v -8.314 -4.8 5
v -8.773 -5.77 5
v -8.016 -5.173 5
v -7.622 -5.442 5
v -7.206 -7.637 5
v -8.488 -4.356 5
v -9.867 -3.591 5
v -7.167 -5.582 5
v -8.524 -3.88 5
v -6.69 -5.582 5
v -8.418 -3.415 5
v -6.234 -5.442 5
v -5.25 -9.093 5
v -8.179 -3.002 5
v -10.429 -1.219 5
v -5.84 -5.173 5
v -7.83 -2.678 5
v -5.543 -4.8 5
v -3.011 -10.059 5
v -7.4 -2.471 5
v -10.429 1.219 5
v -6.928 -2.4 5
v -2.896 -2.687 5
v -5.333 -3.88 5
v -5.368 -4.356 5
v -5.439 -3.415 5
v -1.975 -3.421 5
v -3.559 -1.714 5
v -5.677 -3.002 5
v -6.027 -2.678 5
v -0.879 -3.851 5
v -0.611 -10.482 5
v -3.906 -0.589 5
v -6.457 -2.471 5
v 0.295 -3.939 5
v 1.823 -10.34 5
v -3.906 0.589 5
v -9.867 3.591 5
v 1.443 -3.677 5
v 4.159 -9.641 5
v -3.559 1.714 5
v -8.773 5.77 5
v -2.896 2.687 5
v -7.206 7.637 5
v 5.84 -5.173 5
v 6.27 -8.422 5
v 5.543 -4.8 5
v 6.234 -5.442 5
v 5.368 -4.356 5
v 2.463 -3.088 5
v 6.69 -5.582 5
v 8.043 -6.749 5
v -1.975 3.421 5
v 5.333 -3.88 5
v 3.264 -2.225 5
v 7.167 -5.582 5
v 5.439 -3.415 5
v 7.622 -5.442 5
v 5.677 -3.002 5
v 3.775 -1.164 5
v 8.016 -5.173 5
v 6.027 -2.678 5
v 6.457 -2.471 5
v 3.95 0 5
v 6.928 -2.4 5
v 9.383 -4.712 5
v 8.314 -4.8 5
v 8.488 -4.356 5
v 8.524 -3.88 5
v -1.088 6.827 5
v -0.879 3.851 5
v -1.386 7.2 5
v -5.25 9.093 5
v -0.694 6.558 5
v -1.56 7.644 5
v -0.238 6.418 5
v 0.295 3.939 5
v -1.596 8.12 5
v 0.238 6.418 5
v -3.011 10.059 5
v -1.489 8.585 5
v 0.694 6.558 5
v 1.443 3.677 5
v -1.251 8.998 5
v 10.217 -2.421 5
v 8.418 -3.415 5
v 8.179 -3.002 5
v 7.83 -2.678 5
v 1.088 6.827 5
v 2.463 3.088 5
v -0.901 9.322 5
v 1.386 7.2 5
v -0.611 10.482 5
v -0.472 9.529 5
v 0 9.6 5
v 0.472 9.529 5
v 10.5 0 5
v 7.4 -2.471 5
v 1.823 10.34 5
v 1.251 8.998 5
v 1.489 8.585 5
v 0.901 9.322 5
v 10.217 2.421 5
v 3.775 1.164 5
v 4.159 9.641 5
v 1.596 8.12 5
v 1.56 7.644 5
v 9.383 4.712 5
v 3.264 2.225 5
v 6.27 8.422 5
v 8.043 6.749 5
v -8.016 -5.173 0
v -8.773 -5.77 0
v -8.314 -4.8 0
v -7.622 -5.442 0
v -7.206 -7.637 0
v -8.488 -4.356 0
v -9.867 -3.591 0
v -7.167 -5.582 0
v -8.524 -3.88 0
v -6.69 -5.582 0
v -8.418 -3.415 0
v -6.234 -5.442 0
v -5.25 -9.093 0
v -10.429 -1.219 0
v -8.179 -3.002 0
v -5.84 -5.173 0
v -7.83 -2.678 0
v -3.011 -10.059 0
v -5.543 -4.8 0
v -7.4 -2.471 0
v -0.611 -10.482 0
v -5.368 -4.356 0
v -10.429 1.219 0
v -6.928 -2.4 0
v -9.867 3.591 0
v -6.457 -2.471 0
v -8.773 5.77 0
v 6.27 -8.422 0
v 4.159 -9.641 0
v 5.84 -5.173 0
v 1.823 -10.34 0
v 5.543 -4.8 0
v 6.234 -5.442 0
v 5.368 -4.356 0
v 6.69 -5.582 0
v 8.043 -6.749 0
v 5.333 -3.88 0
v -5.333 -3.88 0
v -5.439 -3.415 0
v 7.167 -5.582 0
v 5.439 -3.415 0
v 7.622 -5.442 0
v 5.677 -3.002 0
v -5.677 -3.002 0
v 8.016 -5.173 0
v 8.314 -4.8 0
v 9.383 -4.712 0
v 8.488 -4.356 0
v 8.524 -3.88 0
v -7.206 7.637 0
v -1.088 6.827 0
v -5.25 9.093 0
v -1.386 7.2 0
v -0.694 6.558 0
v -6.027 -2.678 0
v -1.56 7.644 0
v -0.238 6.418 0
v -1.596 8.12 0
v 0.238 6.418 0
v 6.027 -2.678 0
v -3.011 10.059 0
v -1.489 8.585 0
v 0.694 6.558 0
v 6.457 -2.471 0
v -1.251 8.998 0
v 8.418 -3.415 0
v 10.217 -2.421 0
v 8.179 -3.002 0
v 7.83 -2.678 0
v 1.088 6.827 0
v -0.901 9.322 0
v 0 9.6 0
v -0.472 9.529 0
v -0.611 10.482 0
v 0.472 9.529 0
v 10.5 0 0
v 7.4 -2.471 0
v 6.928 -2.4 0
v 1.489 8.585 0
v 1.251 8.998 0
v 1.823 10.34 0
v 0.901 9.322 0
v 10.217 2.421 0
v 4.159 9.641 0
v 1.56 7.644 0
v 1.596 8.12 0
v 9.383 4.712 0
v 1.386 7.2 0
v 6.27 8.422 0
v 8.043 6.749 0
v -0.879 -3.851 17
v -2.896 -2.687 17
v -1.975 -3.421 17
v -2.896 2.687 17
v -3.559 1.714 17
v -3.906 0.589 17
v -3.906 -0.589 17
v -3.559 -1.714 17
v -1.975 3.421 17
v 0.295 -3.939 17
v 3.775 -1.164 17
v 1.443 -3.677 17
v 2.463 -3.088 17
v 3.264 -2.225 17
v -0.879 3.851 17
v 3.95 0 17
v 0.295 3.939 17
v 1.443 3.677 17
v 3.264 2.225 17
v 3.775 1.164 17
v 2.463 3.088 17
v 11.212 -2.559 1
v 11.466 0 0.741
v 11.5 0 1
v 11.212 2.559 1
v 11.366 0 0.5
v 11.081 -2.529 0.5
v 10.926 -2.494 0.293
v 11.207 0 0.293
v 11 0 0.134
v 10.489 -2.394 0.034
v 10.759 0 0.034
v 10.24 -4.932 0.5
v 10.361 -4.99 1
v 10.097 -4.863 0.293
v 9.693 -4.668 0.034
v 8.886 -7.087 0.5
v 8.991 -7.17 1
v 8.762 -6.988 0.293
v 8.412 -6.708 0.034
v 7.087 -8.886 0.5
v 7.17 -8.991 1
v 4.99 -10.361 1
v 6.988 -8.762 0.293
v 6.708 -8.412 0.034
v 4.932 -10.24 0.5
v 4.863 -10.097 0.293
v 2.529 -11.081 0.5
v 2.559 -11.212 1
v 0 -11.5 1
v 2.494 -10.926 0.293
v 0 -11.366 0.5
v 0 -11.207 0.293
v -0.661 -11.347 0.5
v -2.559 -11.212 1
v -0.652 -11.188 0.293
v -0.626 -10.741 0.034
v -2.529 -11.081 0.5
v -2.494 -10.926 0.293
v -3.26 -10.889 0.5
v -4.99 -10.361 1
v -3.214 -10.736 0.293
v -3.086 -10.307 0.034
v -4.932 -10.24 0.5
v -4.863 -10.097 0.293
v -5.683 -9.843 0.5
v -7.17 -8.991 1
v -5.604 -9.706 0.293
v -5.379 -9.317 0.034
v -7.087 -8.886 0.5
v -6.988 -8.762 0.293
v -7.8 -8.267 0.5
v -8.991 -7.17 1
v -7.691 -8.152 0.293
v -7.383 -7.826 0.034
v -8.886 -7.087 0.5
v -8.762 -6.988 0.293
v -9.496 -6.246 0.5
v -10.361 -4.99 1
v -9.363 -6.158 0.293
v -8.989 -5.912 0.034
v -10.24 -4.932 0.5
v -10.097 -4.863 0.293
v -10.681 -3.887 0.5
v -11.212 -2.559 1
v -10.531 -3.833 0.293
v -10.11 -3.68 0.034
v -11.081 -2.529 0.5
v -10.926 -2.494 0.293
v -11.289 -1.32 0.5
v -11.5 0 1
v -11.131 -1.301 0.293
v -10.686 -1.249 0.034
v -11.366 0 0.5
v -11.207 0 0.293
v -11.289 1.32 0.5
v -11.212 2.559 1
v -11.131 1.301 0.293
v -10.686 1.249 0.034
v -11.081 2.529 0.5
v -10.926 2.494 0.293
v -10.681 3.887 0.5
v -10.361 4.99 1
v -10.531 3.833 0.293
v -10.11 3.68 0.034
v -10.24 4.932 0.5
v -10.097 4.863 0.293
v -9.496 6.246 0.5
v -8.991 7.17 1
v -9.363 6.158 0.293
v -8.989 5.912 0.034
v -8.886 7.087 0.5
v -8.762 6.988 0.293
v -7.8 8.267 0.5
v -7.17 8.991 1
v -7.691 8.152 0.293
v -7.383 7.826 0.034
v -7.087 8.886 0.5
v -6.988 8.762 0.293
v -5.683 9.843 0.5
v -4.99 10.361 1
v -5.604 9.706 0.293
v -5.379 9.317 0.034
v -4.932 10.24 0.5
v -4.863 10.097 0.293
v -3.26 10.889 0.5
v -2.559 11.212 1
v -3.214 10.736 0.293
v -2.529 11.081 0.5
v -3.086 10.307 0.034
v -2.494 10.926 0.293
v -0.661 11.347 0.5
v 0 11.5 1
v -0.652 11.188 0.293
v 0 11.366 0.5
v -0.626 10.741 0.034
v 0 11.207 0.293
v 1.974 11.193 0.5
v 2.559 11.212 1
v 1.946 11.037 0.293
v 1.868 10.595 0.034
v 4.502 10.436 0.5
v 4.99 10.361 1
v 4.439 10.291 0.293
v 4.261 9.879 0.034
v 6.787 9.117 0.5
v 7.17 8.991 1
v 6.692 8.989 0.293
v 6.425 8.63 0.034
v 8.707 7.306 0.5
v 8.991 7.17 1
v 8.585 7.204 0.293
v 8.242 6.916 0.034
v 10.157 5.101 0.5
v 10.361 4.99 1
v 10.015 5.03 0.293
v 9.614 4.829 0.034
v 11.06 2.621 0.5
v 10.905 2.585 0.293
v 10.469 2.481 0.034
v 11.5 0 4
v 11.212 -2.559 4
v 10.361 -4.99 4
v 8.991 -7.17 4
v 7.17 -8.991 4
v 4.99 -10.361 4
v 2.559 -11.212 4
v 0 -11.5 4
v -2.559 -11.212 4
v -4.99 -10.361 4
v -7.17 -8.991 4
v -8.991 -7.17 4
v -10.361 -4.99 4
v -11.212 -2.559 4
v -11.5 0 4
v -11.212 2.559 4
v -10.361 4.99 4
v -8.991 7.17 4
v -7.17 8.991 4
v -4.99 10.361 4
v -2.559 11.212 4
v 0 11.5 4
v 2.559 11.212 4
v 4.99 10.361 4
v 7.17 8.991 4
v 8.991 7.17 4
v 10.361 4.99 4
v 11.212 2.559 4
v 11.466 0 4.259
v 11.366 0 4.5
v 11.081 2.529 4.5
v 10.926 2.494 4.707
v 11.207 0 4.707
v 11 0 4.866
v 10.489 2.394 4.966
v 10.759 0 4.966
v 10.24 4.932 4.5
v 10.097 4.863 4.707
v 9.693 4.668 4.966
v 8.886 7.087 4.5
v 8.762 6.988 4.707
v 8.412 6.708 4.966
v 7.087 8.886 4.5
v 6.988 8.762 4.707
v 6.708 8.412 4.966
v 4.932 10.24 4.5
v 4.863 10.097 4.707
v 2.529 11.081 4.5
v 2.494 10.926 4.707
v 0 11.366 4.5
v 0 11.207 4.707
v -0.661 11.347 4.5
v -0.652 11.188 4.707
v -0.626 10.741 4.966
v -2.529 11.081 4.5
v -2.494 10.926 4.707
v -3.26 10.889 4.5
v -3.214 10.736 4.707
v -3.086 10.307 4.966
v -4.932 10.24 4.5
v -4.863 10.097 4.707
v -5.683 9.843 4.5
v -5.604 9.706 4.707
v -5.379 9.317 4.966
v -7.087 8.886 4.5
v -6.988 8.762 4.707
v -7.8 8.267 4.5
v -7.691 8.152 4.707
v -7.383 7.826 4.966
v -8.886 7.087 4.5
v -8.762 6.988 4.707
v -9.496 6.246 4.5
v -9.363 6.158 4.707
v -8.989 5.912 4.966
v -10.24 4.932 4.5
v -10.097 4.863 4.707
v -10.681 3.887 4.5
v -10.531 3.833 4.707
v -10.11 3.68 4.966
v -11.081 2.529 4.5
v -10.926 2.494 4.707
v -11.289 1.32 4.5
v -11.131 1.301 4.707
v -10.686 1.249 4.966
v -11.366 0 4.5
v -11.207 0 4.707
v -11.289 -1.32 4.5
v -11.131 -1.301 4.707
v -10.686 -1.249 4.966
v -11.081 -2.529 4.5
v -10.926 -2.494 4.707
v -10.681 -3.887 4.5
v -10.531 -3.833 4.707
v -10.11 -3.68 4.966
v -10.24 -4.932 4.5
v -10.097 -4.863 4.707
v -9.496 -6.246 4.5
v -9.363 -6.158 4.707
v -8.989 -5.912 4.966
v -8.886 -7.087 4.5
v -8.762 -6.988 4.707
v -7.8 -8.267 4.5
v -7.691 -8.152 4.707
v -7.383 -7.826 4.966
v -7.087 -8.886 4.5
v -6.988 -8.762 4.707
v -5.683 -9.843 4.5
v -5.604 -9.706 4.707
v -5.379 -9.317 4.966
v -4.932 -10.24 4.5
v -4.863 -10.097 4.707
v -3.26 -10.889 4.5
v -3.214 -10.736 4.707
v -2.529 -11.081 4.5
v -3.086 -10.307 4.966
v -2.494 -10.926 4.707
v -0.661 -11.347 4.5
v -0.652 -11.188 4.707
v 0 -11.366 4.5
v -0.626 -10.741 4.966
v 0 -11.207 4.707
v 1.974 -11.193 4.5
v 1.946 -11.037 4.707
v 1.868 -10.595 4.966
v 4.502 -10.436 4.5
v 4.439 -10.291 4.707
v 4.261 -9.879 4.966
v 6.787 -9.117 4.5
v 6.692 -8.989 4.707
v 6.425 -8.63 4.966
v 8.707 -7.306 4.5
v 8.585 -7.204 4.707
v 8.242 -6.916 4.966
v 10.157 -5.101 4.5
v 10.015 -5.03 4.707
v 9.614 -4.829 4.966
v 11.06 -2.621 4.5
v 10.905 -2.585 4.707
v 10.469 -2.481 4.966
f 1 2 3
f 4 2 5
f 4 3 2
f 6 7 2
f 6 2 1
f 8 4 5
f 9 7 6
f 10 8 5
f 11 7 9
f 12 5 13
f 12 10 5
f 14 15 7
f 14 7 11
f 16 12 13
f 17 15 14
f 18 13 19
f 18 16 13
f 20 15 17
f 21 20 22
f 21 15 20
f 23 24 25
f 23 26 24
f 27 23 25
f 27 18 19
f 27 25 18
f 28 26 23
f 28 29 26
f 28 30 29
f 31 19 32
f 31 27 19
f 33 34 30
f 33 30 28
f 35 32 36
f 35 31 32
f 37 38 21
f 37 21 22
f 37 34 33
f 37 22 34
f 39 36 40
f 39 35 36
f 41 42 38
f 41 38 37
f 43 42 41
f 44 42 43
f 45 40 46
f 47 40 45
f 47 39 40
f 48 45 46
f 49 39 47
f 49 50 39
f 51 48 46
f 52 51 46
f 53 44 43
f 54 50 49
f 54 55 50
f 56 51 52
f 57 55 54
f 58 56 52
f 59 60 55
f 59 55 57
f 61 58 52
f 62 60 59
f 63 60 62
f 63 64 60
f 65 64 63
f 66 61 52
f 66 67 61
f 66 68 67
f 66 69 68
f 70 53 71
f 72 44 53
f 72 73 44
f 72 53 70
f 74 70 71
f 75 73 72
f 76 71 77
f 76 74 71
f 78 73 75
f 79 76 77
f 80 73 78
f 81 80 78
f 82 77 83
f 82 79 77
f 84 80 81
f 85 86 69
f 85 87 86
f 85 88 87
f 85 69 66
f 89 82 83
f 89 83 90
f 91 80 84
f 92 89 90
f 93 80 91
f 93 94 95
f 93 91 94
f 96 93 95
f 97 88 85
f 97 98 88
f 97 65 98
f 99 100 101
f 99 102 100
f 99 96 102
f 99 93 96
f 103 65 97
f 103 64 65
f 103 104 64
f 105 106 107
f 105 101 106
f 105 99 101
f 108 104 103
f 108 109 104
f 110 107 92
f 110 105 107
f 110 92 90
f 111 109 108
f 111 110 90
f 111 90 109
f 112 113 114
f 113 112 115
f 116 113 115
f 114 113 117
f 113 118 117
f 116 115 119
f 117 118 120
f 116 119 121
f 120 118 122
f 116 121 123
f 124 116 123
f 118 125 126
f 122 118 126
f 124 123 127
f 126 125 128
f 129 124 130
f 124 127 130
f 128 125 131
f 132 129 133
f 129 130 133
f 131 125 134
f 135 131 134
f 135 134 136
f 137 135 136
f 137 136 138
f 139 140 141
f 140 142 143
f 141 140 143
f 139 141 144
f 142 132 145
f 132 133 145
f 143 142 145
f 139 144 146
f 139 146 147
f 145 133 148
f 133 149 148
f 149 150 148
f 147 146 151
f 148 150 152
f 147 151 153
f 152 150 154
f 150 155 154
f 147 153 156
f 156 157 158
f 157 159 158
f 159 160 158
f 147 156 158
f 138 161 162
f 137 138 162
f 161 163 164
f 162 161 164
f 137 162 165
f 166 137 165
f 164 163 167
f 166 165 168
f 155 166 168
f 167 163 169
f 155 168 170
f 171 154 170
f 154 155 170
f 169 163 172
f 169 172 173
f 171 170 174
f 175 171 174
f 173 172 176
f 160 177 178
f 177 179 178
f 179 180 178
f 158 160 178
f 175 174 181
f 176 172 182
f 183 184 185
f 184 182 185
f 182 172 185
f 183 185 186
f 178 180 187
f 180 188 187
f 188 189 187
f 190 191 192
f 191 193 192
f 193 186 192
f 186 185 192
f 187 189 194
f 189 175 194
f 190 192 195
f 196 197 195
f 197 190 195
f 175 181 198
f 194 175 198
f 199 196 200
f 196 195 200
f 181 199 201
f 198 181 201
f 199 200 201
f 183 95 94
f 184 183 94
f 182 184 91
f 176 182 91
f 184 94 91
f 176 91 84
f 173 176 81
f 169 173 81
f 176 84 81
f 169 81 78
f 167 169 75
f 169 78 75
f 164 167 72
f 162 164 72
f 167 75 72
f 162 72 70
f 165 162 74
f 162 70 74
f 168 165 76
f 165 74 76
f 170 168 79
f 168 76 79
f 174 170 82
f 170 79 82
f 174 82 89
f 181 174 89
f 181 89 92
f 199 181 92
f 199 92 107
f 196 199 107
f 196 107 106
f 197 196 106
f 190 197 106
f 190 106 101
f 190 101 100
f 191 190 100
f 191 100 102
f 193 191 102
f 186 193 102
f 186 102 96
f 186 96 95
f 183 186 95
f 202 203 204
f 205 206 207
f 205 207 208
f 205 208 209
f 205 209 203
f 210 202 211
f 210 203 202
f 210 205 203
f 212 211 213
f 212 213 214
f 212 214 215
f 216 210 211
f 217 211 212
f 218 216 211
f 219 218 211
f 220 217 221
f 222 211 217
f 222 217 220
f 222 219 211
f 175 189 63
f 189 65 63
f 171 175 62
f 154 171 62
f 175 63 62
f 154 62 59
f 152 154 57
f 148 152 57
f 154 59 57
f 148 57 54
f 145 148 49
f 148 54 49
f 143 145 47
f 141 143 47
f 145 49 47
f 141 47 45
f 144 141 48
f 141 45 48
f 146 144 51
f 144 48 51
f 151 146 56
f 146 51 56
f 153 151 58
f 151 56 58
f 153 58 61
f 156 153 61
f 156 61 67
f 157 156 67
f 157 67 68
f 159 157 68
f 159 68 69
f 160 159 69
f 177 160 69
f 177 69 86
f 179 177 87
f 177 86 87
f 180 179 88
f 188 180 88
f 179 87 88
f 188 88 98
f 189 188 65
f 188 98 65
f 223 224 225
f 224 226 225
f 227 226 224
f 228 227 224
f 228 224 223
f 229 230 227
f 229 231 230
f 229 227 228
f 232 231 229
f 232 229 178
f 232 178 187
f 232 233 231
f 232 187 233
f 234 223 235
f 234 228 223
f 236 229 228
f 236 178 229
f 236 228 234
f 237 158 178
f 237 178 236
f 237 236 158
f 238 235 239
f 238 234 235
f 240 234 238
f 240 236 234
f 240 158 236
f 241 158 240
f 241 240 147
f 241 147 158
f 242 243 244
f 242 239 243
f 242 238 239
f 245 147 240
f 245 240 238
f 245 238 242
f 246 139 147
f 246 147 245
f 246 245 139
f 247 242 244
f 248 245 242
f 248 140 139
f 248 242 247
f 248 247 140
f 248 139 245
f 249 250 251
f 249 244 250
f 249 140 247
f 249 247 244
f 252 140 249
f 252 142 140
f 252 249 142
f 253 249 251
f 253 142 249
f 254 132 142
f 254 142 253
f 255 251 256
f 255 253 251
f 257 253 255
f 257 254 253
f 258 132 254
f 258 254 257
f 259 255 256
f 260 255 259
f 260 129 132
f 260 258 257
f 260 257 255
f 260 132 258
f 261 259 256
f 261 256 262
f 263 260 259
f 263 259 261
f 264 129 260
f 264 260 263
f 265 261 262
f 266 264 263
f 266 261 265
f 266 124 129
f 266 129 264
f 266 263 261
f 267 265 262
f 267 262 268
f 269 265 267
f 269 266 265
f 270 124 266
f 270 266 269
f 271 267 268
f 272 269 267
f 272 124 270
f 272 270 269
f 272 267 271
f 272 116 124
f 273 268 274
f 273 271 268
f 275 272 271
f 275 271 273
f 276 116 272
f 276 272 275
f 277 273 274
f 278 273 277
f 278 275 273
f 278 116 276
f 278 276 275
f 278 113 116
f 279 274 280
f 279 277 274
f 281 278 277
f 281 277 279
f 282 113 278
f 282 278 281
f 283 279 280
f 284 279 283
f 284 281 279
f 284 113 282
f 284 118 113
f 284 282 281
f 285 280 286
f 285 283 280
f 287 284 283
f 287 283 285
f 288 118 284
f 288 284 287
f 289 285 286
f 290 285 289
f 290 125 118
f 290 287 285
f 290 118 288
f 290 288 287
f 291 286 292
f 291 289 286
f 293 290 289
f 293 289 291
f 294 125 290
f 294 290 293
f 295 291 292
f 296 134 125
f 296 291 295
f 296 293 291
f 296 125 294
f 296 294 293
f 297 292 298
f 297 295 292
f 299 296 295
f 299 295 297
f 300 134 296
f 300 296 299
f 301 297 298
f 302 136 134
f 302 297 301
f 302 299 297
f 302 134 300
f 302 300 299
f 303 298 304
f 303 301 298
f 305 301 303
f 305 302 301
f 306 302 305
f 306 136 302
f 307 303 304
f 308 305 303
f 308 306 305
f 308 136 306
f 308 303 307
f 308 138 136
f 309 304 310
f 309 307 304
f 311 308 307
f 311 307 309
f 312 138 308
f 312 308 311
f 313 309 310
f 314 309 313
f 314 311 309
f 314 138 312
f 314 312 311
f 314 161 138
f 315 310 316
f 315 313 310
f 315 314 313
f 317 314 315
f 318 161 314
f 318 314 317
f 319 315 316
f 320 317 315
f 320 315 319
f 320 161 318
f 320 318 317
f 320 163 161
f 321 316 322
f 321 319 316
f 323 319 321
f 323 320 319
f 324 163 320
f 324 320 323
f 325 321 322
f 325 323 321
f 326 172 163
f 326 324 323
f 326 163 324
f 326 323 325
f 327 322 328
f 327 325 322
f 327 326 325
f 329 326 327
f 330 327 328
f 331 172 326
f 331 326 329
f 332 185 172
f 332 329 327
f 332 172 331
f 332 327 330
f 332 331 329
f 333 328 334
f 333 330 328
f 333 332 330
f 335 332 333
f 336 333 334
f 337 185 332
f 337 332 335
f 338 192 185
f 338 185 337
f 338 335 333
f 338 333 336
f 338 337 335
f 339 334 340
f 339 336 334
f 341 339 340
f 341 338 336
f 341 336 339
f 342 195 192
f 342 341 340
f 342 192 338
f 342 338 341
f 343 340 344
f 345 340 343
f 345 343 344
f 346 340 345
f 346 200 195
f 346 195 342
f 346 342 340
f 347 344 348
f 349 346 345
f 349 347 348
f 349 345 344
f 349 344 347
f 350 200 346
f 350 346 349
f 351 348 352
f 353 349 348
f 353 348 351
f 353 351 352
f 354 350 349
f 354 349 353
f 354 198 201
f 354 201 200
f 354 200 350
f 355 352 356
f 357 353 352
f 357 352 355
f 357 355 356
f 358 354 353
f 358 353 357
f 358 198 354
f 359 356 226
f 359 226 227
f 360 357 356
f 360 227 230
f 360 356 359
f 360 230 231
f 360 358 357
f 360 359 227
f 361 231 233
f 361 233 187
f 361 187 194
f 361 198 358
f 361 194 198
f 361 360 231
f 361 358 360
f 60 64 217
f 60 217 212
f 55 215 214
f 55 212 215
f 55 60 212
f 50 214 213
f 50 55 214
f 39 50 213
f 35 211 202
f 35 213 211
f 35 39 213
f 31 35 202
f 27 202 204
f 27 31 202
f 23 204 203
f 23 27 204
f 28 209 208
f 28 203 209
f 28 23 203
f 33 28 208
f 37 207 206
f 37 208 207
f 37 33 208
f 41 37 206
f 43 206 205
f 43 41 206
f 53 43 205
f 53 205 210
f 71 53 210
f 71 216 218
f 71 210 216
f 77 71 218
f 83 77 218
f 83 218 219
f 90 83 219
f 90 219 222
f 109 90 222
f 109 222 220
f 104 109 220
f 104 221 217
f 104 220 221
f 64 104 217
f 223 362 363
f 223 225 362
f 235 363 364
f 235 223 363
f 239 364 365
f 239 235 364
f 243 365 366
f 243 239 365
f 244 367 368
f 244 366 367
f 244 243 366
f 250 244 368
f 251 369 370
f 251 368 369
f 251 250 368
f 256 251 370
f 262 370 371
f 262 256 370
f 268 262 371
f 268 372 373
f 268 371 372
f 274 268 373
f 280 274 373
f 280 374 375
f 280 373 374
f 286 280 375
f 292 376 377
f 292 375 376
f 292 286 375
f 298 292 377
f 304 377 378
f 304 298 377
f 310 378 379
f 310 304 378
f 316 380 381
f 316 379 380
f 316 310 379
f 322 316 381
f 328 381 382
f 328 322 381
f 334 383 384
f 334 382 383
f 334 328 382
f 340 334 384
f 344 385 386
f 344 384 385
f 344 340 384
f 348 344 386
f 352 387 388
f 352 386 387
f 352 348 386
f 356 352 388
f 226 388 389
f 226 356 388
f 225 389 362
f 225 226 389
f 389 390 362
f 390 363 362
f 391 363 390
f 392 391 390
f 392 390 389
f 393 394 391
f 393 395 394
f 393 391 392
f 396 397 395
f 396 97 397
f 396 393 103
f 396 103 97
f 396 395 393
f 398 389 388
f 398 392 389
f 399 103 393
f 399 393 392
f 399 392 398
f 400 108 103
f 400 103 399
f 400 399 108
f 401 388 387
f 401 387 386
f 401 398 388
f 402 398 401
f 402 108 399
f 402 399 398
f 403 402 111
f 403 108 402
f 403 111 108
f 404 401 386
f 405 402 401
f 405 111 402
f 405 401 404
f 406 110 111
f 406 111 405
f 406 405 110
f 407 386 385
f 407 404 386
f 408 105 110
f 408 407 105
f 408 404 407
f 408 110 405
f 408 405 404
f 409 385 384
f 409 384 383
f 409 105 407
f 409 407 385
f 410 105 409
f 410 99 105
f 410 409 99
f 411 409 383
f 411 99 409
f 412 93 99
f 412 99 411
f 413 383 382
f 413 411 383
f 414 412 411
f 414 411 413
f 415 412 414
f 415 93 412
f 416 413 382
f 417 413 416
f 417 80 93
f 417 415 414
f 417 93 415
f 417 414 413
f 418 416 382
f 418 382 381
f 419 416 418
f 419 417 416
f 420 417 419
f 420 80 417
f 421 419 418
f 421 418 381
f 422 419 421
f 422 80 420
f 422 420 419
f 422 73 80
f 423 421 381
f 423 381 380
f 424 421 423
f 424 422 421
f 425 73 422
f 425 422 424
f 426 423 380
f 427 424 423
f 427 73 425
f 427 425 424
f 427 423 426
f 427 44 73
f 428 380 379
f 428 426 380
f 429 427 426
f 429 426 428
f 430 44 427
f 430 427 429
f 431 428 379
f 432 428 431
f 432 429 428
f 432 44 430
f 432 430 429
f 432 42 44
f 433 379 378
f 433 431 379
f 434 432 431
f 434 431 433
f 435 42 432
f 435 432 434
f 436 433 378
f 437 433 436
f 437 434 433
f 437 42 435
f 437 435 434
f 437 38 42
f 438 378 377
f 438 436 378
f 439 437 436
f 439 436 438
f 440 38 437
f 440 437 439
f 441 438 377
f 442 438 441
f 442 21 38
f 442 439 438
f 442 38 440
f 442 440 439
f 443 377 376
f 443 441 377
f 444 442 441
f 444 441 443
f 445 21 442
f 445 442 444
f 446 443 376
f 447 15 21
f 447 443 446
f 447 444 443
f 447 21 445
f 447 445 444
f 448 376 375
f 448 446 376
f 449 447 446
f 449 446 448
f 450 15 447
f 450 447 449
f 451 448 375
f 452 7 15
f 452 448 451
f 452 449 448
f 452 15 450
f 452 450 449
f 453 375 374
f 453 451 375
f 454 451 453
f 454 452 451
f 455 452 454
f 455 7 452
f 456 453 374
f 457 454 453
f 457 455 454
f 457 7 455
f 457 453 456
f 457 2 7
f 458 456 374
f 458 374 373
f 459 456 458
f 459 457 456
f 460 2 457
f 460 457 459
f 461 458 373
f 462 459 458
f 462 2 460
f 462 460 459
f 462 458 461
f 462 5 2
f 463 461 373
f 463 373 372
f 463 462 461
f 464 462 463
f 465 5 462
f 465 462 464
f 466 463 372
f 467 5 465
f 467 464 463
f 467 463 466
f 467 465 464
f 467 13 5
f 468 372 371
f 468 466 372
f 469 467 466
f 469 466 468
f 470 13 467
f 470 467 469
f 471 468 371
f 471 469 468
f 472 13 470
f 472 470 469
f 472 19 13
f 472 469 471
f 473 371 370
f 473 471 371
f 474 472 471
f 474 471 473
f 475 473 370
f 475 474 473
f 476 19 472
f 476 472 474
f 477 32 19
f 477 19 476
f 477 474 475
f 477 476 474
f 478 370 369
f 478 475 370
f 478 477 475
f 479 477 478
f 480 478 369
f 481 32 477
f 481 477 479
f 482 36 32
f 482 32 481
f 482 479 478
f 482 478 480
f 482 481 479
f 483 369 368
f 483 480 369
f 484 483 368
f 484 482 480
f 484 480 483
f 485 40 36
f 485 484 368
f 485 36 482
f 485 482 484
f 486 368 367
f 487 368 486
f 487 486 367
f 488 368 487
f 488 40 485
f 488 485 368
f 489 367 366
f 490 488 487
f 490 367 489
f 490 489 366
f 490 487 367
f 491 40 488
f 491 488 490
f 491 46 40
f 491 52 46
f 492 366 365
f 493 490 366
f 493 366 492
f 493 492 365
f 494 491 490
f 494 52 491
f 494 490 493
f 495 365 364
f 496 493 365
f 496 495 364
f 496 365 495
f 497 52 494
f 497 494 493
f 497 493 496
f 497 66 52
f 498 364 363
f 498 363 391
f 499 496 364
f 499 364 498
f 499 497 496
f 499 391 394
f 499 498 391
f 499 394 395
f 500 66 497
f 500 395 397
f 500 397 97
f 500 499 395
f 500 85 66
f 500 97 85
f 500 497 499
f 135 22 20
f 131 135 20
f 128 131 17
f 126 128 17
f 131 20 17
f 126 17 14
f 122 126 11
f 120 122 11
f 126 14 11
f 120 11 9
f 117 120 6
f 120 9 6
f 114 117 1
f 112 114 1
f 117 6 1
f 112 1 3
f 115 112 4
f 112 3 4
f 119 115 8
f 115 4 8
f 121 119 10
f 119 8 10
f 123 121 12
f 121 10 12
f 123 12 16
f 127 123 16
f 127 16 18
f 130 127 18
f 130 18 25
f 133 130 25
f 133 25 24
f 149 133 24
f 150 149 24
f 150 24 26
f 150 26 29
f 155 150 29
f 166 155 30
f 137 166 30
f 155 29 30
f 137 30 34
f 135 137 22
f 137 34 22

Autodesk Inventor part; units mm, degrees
ref_plane "YZ Plane" through (0, 0, 0) normal (1, 0, 0) x (0, 1, 0)
ref_plane "XZ Plane" through (0, 0, 0) normal (0, 1, 0) x (-1, 0, 0)
ref_plane "XY Plane" through (0, 0, 0) normal (0, 0, 1) x (1, 0, 0)
sketch "Sketch1" plane through (0, 0, 0) normal (0, 0, 1) x (1, 0, 0)
  circle A0 centre (0, 0) radius 11.5
  dimension "d0" = 23
extrude "Extrusion1" add sketch "Sketch1" along normal blind 5
sketch "Sketch2" plane through (0, 0, 5) normal (0, 0, 1) x (1, 0, 0)
  circle A0 centre (0, 0) radius 3.95
  dimension "d3" = 7.9
extrude "Extrusion2" add sketch "Sketch2" along normal blind 12
sketch "Sketch3" plane through (0, 0, 0) normal (0, 0, -1) x (-1, 0, 0)
  circle A0 centre (0, 0) radius 4
  point P0 (0, 8)
  point P1 (-6.9282, -4)
  point P2 (6.9282, -4)
  dimension "d8" = 360
  dimension "d17" = 8
hole "Hole1" at (0, 8, 0) at (6.9282, -4, 0) at (-6.9282, -4, 0) direction (0, 0, 1) diameter 3.2 end through all
fillet "Fillet1" radius 1 2 edges at (-11.5, 0, 0) (-11.5, 0, 5)
properties part number "Eixo de suporte II"
